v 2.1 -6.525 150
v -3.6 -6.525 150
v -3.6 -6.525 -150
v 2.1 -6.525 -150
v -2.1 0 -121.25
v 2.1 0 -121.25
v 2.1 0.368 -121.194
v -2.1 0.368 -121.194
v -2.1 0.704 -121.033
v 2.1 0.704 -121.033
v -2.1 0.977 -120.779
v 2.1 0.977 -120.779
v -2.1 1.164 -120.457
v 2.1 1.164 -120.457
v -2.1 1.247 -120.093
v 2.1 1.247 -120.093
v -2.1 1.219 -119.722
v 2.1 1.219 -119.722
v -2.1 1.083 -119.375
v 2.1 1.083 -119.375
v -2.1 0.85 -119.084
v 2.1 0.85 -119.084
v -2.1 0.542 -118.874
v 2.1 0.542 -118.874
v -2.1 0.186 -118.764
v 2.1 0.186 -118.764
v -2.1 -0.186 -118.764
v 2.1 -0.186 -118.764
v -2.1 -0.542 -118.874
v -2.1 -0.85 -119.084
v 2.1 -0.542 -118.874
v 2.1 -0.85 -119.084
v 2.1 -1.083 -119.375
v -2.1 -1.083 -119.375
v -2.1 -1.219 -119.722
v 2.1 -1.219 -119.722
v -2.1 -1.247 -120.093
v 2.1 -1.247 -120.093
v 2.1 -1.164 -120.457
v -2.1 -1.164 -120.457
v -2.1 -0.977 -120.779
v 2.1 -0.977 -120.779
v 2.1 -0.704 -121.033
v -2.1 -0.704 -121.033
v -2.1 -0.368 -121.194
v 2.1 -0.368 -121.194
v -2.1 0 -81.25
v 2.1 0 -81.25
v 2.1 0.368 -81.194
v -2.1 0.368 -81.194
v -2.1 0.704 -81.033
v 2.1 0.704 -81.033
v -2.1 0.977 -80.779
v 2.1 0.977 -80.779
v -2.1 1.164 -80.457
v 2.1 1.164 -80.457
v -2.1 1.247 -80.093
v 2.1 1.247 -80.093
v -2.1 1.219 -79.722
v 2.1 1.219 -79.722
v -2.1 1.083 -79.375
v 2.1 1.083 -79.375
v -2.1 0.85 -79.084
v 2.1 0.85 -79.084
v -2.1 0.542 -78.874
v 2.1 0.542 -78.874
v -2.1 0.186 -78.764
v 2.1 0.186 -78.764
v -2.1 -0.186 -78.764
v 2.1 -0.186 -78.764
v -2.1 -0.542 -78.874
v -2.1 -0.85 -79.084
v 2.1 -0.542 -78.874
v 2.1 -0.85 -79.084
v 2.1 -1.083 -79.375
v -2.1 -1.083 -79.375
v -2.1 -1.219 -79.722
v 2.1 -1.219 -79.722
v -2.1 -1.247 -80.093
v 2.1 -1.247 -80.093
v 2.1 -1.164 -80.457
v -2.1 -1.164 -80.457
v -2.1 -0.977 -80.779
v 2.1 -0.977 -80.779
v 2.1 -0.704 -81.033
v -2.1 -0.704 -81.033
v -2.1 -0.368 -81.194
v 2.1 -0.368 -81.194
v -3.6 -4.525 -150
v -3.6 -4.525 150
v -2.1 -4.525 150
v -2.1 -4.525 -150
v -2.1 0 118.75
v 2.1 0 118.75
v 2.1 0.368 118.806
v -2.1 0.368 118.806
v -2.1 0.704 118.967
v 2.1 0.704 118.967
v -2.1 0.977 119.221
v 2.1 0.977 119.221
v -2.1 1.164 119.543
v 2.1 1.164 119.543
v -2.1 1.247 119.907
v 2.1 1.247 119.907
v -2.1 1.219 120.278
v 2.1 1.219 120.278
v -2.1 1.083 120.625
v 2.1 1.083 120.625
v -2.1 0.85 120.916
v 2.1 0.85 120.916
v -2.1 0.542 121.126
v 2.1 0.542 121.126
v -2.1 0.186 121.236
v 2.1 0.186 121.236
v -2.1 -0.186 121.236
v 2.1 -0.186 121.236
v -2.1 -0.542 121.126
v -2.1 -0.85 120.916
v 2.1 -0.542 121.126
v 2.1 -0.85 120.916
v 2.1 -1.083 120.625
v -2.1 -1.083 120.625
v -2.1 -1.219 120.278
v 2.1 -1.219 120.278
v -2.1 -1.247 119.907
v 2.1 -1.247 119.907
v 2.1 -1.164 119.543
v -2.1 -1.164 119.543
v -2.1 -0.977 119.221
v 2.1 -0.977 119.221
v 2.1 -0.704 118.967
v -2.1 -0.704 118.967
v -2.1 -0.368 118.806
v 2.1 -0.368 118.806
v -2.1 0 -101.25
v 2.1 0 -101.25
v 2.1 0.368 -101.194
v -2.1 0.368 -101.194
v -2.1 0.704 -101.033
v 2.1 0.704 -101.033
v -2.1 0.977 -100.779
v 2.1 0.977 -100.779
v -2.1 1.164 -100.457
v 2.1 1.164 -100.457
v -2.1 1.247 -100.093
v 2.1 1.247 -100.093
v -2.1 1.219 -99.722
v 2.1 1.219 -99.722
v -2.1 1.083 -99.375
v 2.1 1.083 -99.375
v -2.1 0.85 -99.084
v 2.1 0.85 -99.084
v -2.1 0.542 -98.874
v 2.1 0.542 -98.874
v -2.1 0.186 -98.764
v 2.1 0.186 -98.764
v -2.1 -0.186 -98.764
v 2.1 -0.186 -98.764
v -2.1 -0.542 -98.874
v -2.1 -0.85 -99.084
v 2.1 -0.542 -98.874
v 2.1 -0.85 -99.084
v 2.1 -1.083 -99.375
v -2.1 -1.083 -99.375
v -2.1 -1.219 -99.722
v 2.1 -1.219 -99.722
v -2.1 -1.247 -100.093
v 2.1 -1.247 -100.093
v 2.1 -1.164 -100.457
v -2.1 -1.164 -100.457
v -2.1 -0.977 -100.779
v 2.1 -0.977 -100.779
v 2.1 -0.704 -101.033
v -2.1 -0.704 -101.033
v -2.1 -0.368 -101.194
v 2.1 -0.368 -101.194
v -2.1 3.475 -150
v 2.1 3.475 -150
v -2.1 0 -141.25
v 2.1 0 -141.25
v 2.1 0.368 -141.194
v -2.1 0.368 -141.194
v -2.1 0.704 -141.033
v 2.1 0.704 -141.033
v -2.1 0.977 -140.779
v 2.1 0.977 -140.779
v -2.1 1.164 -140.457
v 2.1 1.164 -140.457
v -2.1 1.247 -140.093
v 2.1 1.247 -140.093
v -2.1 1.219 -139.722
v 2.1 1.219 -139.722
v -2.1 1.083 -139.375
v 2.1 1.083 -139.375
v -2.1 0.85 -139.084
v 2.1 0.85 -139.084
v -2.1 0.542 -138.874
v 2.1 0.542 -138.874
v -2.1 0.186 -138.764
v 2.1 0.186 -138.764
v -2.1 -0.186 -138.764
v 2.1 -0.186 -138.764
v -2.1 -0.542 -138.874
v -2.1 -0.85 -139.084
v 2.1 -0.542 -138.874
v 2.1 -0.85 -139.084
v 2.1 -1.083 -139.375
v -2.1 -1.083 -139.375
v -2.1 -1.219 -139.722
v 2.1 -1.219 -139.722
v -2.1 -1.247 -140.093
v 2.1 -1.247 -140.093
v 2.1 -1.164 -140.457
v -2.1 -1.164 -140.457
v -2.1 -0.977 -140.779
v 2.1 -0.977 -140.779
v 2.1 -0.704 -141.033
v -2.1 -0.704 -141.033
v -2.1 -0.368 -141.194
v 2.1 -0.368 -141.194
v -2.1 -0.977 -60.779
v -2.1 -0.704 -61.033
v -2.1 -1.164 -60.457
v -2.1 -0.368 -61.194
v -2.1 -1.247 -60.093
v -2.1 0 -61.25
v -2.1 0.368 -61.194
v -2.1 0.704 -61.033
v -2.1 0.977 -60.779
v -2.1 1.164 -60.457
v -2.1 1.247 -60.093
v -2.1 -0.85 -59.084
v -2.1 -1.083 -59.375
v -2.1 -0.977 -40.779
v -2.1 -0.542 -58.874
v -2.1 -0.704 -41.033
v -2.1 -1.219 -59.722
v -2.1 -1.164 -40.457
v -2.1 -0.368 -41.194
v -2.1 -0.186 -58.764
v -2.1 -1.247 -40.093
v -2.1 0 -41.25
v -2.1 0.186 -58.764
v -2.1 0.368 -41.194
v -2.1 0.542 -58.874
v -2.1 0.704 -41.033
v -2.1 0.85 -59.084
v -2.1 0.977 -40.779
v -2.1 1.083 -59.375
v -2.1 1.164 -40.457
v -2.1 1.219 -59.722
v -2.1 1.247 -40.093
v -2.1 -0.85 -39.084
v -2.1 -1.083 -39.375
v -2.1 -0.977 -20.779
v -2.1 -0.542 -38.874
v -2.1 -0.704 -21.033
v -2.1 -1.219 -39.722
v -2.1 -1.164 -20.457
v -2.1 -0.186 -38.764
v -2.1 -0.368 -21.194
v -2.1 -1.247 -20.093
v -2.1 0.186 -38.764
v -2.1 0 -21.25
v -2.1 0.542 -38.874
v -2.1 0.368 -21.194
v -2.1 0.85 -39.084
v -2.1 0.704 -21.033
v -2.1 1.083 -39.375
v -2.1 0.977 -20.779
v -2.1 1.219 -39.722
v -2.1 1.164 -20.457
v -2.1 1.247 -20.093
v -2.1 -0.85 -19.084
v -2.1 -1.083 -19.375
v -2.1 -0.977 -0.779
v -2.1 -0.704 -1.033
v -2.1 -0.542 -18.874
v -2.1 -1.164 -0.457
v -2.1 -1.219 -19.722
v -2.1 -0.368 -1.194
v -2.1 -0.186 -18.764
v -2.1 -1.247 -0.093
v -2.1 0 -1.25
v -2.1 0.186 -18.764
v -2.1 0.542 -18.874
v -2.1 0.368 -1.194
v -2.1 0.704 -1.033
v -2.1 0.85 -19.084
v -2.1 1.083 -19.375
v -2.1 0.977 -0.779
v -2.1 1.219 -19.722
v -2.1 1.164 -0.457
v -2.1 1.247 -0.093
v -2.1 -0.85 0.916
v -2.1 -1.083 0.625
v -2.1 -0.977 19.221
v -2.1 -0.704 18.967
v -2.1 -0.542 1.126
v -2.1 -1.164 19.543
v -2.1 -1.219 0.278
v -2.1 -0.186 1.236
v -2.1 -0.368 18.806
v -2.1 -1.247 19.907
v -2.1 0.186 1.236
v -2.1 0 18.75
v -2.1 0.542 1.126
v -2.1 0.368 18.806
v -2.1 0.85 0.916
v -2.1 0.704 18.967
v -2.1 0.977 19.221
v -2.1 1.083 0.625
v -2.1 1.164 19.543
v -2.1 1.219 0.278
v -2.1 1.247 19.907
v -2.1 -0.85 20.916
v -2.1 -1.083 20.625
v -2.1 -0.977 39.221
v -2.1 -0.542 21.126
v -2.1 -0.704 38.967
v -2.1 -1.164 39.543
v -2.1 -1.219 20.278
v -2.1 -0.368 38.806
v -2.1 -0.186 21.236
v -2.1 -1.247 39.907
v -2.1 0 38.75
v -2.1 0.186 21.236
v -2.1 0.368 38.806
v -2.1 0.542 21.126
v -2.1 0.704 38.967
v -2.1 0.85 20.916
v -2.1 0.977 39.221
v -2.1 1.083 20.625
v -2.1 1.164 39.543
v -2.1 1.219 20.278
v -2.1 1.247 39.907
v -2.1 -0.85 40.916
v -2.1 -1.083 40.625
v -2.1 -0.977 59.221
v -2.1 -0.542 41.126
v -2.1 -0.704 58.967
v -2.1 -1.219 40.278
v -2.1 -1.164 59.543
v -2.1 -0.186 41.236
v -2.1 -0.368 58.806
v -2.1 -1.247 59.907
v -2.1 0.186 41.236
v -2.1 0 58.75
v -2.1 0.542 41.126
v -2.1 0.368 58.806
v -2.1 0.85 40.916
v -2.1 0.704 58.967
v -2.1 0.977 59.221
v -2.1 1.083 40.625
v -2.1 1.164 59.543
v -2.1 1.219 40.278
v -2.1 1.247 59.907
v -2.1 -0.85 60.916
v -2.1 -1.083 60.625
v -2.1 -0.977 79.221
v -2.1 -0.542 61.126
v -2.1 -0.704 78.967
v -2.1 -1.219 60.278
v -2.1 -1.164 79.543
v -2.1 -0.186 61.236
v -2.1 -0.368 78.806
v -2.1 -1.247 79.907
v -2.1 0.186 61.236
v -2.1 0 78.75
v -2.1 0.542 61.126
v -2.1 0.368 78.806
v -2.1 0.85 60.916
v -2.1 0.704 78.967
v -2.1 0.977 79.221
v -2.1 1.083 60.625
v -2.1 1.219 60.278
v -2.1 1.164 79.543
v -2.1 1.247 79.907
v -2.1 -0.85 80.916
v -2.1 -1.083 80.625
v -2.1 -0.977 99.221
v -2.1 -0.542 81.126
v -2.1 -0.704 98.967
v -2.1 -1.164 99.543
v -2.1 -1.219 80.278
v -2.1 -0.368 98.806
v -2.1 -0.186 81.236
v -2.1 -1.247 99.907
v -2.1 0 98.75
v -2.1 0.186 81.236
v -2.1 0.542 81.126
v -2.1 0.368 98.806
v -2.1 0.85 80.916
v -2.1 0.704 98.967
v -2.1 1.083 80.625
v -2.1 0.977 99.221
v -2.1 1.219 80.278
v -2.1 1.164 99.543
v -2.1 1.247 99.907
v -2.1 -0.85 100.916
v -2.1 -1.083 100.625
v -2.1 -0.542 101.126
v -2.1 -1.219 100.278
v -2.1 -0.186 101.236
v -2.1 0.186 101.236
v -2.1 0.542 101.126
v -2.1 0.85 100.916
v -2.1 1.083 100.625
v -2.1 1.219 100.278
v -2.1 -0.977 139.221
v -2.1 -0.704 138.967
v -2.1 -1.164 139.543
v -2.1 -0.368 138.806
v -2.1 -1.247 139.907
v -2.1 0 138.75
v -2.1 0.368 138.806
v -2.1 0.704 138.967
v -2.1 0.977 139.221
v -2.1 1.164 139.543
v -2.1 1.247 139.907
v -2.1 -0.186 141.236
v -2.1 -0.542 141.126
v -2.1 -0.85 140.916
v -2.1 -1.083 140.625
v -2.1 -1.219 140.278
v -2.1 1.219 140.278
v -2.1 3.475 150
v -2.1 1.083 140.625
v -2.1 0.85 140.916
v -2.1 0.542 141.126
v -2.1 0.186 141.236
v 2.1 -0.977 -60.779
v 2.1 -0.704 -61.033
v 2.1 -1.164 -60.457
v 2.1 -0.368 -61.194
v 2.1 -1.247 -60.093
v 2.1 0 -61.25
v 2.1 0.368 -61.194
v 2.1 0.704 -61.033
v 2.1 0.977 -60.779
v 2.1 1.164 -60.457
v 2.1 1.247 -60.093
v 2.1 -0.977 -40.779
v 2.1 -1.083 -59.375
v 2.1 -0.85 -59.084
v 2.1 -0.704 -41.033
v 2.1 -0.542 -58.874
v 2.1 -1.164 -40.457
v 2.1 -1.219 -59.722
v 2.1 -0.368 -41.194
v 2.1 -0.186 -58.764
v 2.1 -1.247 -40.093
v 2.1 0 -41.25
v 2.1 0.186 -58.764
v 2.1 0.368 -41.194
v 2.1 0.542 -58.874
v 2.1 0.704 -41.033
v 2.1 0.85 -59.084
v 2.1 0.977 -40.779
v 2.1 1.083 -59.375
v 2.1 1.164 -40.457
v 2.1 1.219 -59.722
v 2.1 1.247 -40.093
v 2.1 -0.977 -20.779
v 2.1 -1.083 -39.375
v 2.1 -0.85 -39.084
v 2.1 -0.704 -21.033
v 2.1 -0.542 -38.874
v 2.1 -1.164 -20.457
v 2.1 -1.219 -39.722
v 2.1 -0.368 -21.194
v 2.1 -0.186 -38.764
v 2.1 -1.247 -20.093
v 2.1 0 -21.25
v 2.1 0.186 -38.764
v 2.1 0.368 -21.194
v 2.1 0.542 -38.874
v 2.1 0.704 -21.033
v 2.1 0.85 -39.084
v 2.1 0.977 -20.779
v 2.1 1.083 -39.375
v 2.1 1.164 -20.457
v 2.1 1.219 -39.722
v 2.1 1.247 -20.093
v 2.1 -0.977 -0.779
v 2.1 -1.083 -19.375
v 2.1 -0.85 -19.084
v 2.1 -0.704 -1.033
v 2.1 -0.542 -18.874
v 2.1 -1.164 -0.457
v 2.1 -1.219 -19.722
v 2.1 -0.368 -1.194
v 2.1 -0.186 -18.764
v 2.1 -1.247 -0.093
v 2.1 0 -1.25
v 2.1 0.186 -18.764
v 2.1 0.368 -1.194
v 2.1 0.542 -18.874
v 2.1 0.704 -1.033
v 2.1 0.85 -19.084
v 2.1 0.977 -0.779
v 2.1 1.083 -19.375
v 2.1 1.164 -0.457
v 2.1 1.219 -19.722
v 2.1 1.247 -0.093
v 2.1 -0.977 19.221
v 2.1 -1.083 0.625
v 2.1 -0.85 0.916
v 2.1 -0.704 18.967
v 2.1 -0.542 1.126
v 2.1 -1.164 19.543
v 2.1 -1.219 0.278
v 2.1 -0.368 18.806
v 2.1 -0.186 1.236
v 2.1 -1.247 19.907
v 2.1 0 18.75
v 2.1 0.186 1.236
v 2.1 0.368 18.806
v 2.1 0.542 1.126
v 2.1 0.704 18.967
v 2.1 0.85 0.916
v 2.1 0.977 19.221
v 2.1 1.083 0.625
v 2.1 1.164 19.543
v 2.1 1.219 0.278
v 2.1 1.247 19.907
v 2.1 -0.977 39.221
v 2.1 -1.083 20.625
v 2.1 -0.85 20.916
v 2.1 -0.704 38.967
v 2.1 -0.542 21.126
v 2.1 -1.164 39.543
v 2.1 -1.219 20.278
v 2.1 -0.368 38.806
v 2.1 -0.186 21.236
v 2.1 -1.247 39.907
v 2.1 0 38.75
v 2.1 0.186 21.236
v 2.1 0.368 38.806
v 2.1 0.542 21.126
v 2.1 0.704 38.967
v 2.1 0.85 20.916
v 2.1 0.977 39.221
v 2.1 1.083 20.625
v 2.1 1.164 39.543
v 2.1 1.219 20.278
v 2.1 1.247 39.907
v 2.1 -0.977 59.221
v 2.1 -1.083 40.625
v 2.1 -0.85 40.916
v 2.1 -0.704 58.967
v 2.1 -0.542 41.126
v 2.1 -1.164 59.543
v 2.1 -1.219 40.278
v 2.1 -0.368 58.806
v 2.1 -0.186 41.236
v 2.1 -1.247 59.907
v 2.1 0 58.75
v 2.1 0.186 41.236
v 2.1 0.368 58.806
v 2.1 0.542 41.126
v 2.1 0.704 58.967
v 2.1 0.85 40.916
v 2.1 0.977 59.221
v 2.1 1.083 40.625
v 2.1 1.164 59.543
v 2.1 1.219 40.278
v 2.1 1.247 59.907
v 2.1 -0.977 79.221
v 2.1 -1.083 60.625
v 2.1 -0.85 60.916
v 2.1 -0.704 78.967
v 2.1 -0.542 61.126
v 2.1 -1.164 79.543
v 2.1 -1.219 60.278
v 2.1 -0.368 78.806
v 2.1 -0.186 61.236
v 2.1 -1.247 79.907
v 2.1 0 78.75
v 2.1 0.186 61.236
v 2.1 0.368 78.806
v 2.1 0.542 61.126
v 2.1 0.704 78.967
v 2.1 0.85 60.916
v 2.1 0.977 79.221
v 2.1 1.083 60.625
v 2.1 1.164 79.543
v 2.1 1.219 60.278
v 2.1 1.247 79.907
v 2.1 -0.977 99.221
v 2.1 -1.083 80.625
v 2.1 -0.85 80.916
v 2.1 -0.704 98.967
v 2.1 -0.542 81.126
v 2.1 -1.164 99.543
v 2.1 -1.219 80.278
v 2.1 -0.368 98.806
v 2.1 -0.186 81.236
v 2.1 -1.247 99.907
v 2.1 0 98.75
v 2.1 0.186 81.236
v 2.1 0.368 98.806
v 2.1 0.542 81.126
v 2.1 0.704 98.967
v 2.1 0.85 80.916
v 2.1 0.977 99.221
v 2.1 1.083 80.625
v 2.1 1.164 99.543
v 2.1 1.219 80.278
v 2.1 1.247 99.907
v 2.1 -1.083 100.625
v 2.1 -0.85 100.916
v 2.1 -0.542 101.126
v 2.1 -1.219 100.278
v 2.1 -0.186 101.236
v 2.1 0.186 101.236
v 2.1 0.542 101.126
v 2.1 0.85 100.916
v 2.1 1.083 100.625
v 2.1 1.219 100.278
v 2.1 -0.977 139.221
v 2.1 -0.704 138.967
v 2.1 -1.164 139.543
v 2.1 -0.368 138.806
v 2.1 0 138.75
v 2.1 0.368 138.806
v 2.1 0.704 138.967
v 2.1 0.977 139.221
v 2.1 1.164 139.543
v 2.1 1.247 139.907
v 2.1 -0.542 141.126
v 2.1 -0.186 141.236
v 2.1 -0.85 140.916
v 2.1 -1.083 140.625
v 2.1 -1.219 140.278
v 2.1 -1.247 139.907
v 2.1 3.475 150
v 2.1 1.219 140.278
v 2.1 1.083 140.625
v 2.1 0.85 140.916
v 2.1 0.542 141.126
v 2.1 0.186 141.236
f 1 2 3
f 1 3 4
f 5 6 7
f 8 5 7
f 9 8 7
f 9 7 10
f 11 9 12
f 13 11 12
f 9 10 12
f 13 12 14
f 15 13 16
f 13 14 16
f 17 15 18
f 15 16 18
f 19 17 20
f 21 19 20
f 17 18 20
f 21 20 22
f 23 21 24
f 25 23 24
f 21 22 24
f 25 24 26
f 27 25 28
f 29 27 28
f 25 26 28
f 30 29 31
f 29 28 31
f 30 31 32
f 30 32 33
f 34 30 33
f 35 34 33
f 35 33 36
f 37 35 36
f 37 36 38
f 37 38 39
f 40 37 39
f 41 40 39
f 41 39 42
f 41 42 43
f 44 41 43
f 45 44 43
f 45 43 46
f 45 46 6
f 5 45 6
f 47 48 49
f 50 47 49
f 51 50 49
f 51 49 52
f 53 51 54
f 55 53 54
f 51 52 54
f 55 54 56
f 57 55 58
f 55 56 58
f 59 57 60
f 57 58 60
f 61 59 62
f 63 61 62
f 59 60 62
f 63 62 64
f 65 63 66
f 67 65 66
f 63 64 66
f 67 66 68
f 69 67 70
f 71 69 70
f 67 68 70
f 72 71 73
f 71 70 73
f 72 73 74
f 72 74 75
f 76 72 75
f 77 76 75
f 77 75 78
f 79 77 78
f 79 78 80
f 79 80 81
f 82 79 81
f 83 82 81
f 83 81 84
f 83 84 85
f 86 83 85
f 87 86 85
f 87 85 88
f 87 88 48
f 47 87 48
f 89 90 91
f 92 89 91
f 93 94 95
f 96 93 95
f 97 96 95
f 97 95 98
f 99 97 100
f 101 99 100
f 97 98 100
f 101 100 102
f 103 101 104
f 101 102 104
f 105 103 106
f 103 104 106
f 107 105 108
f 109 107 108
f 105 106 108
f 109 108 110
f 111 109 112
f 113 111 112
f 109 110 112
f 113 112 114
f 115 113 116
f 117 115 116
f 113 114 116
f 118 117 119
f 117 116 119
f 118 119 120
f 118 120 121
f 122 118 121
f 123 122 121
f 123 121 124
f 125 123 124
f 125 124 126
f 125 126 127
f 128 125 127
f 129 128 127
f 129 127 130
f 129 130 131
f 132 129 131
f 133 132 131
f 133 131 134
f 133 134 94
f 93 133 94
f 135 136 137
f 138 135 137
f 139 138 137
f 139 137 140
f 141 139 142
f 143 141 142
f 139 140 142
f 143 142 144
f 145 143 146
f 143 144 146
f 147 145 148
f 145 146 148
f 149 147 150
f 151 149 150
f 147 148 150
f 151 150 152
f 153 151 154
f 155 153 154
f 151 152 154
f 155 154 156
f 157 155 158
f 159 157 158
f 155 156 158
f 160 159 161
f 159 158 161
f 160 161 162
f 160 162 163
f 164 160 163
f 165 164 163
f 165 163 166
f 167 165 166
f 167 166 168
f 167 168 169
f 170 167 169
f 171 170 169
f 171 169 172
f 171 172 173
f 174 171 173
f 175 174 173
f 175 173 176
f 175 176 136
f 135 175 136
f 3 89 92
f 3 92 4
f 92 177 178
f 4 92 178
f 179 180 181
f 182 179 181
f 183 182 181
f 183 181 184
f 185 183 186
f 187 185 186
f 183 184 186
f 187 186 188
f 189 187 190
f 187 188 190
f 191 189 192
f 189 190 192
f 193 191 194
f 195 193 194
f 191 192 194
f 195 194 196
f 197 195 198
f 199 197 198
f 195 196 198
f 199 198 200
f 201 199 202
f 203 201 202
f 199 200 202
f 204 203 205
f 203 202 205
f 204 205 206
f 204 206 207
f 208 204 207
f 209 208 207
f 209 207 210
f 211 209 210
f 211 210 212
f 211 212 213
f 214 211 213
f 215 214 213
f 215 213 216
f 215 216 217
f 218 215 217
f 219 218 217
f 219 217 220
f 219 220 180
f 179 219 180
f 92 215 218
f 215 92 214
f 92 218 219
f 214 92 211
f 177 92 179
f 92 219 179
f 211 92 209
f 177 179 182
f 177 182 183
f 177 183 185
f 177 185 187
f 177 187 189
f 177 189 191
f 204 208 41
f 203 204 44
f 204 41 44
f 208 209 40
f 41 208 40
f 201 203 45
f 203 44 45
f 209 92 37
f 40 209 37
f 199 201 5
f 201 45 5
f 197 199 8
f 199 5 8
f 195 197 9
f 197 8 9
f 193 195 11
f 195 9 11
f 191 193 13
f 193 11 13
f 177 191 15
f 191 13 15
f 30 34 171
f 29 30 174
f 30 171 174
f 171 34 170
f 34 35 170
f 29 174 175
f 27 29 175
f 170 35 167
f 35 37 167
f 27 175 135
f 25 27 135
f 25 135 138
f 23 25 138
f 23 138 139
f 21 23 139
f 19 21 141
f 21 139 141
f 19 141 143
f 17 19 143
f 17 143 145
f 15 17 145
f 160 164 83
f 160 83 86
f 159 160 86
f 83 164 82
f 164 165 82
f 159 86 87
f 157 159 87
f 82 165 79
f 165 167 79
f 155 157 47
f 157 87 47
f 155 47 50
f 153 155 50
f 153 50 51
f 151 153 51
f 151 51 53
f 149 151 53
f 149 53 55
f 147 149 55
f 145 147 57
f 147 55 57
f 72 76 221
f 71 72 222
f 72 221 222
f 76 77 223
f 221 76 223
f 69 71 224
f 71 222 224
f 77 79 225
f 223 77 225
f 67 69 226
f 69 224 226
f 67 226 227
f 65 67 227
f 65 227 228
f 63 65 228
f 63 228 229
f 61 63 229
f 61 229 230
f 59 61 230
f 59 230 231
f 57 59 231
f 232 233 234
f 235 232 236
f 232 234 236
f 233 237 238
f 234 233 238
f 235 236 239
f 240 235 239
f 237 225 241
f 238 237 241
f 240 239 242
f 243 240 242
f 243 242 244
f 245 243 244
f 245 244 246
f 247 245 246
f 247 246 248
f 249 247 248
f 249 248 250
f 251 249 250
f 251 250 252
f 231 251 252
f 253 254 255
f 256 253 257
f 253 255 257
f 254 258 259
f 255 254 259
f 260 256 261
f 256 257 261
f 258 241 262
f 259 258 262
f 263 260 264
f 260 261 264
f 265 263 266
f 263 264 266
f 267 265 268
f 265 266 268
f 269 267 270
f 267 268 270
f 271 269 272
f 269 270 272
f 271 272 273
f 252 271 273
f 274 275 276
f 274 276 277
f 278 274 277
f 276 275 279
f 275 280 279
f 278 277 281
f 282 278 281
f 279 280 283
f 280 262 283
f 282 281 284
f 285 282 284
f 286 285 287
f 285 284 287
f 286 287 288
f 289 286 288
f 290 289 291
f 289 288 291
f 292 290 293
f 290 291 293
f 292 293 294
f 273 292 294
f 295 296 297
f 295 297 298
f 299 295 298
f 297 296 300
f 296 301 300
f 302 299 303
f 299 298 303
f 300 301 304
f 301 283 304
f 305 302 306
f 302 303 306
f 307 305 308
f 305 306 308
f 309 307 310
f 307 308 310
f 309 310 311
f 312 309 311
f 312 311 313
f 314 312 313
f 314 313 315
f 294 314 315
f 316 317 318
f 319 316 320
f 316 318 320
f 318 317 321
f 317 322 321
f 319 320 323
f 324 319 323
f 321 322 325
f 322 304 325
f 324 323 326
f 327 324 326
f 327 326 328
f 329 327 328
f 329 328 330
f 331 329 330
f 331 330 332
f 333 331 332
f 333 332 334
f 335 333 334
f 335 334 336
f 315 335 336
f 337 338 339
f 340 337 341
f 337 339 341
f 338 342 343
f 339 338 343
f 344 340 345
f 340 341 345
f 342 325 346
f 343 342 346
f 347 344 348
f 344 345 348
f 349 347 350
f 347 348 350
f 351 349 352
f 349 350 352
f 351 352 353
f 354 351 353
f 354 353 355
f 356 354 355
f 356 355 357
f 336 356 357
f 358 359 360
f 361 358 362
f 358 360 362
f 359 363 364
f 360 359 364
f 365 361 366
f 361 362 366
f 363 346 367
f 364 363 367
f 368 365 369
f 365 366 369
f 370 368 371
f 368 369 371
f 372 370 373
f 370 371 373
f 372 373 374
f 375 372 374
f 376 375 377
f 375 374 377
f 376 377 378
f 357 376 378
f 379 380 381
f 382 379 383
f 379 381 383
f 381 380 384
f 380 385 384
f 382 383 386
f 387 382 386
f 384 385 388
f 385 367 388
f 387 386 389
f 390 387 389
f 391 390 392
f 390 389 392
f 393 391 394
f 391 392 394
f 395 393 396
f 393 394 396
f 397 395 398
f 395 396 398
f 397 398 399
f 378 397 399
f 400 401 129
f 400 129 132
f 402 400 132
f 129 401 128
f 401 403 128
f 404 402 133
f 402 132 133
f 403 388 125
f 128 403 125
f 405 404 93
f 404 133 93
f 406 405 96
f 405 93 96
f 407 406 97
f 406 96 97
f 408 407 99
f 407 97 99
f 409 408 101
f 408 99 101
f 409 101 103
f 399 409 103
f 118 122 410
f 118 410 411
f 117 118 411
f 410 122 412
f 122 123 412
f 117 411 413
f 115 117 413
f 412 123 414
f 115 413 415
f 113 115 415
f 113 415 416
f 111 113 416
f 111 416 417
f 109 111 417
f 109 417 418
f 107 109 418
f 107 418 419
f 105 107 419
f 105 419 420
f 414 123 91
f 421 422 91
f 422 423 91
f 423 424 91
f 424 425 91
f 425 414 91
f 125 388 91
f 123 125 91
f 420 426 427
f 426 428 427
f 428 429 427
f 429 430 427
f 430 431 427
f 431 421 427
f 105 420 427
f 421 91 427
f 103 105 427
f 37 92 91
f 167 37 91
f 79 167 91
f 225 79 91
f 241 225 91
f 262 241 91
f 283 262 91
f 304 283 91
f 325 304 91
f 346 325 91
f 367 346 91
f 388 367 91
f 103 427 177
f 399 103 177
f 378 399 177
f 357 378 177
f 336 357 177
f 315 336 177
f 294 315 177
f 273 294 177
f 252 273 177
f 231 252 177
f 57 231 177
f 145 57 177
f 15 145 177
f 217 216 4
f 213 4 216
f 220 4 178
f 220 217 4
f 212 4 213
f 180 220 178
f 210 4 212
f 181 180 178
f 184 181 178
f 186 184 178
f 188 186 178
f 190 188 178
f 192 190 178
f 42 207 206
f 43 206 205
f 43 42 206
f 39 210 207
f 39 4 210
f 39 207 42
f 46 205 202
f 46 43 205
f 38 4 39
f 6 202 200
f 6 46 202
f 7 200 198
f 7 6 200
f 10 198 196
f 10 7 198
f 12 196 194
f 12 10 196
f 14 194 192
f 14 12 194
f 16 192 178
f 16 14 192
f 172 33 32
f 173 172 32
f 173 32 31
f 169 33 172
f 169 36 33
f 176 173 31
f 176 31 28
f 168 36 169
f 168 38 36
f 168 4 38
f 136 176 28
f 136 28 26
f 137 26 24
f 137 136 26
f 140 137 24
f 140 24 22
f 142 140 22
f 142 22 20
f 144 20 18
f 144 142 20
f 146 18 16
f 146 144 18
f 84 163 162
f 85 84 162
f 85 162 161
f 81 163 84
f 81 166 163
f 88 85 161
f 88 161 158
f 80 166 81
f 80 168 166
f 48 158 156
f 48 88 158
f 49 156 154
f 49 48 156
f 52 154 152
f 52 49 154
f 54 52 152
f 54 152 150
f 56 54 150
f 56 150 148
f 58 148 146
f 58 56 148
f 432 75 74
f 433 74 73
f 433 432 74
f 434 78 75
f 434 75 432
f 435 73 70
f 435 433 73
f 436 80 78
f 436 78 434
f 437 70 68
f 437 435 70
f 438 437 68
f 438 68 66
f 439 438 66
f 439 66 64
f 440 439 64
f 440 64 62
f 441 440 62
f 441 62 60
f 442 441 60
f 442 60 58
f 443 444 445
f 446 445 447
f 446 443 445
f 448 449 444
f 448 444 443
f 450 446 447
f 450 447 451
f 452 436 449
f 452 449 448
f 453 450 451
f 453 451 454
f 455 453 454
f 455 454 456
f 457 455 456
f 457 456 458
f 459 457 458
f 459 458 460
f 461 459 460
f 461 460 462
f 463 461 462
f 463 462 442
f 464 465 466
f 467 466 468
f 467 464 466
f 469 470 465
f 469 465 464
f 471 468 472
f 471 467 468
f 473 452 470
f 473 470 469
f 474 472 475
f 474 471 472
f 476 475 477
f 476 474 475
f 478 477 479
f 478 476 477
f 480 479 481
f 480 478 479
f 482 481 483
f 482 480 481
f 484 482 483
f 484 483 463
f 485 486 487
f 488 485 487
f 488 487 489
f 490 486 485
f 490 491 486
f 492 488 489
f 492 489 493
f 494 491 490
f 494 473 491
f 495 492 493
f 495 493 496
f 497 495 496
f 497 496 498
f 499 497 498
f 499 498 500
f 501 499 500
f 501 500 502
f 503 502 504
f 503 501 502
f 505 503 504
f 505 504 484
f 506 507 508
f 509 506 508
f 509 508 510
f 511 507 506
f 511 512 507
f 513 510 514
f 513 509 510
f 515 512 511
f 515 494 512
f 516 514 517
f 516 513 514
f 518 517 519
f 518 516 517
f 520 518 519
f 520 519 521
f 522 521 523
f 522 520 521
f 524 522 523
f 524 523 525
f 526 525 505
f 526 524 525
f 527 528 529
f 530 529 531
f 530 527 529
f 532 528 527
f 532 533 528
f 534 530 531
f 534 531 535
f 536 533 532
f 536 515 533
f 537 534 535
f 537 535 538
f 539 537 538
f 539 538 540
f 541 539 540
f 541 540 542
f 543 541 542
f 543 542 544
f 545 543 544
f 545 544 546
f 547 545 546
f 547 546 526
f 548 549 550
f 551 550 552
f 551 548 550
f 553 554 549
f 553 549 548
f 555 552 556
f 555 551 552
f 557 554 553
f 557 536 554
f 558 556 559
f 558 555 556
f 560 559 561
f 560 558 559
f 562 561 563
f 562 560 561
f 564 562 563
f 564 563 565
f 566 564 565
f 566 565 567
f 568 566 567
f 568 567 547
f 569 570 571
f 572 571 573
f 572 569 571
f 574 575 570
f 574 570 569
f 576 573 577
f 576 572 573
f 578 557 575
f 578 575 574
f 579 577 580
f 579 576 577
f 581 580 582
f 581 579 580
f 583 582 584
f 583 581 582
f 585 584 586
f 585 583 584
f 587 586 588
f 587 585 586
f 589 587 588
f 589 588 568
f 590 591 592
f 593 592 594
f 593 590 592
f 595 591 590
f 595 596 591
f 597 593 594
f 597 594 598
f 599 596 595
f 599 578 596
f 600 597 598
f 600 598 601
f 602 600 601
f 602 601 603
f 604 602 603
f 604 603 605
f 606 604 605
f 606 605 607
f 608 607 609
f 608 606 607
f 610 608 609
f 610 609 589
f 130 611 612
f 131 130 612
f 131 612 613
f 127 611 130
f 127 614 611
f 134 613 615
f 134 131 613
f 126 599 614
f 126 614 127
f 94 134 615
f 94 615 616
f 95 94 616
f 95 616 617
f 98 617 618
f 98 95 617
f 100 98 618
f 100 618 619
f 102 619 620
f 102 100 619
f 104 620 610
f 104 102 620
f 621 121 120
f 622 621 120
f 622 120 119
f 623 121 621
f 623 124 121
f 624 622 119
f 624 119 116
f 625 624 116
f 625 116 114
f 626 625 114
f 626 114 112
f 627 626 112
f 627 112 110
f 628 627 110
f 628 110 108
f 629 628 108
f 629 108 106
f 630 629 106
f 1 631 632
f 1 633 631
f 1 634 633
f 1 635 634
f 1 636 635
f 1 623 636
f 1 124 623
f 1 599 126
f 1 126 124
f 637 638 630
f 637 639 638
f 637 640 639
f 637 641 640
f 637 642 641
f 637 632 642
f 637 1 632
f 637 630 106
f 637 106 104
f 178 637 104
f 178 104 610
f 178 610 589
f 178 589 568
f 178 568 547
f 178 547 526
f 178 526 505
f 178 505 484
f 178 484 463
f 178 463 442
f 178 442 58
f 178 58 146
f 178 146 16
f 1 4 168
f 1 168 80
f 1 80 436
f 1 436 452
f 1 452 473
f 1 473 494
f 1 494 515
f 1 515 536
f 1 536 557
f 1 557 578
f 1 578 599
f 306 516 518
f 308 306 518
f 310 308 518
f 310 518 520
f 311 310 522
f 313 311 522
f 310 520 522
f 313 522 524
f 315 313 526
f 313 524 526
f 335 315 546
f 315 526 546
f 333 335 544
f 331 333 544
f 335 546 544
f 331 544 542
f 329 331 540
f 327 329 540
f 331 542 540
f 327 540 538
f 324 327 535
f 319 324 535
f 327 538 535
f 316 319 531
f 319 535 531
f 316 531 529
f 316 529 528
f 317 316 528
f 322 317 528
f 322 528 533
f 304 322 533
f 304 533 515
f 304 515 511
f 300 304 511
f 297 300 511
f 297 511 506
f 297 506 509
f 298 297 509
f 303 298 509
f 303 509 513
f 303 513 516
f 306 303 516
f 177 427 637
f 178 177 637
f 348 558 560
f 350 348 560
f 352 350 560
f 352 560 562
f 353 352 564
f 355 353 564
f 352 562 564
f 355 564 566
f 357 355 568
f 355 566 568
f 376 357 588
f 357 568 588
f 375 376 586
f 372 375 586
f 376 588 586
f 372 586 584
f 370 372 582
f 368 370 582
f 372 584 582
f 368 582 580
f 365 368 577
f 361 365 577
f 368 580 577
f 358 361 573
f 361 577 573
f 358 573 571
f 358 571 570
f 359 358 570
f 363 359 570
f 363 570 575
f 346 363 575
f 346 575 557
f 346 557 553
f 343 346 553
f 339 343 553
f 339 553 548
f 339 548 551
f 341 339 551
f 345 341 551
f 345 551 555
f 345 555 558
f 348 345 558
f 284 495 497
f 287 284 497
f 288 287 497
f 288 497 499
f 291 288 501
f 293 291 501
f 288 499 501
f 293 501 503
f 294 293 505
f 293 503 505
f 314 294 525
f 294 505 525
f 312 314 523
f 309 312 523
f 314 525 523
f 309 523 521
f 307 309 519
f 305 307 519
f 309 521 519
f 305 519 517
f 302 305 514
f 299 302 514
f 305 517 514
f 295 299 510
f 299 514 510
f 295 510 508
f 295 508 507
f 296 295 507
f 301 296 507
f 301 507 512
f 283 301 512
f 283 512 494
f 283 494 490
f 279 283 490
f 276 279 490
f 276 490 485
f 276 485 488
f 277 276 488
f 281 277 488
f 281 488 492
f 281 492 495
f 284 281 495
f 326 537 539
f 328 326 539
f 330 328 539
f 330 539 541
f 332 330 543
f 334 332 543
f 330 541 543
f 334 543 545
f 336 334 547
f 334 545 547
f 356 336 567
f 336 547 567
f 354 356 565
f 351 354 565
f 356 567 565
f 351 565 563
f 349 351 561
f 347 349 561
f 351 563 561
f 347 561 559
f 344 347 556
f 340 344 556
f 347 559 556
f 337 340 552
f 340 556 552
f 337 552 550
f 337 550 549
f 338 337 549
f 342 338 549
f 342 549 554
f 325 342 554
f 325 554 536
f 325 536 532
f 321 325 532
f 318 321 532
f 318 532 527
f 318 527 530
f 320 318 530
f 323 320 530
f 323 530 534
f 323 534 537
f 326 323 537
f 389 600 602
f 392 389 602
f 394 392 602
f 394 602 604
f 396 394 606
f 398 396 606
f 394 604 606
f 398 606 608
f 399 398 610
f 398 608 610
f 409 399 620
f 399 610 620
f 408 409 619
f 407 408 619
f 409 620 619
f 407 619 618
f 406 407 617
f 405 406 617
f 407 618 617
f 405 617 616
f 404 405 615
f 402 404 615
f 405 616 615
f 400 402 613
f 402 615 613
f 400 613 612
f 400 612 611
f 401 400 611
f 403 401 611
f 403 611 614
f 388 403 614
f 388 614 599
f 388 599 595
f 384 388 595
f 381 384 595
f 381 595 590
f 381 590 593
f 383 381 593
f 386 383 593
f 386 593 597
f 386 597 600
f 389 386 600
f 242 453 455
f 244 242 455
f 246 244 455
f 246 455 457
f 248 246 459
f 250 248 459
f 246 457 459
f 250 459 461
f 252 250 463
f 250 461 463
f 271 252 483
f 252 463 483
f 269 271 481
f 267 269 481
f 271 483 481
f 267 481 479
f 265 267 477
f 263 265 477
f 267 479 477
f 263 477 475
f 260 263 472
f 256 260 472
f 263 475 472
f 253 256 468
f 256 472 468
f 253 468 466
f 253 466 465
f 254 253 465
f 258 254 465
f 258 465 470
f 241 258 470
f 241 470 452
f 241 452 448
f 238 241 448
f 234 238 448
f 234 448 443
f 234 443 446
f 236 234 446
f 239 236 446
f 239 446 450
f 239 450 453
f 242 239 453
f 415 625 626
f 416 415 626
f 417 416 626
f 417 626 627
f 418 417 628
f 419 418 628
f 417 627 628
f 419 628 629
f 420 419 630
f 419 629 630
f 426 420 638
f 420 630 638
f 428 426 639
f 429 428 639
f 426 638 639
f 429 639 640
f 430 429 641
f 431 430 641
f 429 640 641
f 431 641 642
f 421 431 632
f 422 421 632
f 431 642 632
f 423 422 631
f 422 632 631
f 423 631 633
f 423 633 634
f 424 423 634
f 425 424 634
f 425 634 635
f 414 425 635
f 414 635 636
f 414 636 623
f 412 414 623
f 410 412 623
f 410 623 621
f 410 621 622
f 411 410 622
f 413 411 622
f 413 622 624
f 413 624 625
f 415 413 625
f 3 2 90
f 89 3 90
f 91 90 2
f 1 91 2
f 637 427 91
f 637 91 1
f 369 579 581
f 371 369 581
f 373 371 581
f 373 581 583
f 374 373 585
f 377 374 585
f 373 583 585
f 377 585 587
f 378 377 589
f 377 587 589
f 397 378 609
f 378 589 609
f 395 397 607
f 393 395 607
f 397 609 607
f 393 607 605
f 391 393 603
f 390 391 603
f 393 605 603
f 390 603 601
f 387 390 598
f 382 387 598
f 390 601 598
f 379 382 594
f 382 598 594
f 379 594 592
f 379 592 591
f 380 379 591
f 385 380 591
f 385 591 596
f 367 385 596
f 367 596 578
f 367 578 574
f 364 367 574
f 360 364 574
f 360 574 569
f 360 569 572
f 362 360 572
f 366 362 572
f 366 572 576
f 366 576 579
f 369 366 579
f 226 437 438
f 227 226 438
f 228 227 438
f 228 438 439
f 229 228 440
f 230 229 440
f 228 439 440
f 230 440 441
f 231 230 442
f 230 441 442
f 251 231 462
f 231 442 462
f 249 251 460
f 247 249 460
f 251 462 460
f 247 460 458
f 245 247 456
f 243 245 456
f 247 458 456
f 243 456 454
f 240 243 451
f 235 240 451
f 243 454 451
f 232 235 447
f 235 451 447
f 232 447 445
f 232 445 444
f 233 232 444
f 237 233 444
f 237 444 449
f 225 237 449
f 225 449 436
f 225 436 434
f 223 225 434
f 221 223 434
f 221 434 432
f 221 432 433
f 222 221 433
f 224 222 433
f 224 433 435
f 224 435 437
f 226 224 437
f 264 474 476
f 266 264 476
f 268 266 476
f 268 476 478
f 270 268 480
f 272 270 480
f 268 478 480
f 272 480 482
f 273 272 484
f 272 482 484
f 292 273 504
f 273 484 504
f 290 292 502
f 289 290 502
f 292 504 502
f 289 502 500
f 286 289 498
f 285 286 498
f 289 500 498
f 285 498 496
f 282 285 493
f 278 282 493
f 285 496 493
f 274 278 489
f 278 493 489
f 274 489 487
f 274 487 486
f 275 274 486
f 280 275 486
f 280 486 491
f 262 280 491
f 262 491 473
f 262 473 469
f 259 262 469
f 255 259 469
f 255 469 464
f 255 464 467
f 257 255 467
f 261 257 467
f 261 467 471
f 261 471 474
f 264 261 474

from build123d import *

# Parameters (mm, degrees)
SKETCH1_W             = 4.2
SKETCH1_H             = 9.05
BOSS_EXTRUDE1_DEPTH   = 150
M3X0_5_TAPPED_HOLE1_D = 2.5
LPATTERN1_COUNT       = 15
LPATTERN1_PITCH       = 20
SKETCH7_W             = 5.7
SKETCH7_H             = 2
BOSS_EXTRUDE3_DEPTH   = 300
SKETCH9_W             = 5.7
SKETCH9_H             = 3.05
CUT_EXTRUDE2_DEPTH    = 301


with BuildPart() as part:
    # Sketch1 → Boss-Extrude1 (new body, symmetric)
    with BuildSketch(Plane.XY):
        Rectangle(SKETCH1_W, SKETCH1_H)
    extrude(amount=BOSS_EXTRUDE1_DEPTH, both=True)

    # M3x0.5 Tapped Hole1 (through all)
    with Locations(Plane.ZY.offset(2.1)):
        with Locations((-140, 0)):
            m3x0_5_tapped_hole1 = Hole(M3X0_5_TAPPED_HOLE1_D / 2)

    # LPattern1: M3x0.5 Tapped Hole1 ×15
    with Locations(*[(0, 0, i * LPATTERN1_PITCH) for i in range(1, LPATTERN1_COUNT)]):
        add(m3x0_5_tapped_hole1, mode=Mode.SUBTRACT)

    # Sketch7 → Boss-Extrude3 (add)
    with BuildSketch(Plane.XY.offset(150)):
        with Locations((-0.75, 5.525)):
            Rectangle(SKETCH7_W, SKETCH7_H)
        with Locations((-0.75, -5.525)):
            Rectangle(SKETCH7_W, SKETCH7_H)
    extrude(amount=-BOSS_EXTRUDE3_DEPTH)

    # Sketch9 → Cut-Extrude2 (cut, through all)
    with BuildSketch(Plane.XY.offset(150)):
        with Locations((-0.75, 5)):
            Rectangle(SKETCH9_W, SKETCH9_H)
    extrude(amount=-CUT_EXTRUDE2_DEPTH, mode=Mode.SUBTRACT)


solid = part.part
